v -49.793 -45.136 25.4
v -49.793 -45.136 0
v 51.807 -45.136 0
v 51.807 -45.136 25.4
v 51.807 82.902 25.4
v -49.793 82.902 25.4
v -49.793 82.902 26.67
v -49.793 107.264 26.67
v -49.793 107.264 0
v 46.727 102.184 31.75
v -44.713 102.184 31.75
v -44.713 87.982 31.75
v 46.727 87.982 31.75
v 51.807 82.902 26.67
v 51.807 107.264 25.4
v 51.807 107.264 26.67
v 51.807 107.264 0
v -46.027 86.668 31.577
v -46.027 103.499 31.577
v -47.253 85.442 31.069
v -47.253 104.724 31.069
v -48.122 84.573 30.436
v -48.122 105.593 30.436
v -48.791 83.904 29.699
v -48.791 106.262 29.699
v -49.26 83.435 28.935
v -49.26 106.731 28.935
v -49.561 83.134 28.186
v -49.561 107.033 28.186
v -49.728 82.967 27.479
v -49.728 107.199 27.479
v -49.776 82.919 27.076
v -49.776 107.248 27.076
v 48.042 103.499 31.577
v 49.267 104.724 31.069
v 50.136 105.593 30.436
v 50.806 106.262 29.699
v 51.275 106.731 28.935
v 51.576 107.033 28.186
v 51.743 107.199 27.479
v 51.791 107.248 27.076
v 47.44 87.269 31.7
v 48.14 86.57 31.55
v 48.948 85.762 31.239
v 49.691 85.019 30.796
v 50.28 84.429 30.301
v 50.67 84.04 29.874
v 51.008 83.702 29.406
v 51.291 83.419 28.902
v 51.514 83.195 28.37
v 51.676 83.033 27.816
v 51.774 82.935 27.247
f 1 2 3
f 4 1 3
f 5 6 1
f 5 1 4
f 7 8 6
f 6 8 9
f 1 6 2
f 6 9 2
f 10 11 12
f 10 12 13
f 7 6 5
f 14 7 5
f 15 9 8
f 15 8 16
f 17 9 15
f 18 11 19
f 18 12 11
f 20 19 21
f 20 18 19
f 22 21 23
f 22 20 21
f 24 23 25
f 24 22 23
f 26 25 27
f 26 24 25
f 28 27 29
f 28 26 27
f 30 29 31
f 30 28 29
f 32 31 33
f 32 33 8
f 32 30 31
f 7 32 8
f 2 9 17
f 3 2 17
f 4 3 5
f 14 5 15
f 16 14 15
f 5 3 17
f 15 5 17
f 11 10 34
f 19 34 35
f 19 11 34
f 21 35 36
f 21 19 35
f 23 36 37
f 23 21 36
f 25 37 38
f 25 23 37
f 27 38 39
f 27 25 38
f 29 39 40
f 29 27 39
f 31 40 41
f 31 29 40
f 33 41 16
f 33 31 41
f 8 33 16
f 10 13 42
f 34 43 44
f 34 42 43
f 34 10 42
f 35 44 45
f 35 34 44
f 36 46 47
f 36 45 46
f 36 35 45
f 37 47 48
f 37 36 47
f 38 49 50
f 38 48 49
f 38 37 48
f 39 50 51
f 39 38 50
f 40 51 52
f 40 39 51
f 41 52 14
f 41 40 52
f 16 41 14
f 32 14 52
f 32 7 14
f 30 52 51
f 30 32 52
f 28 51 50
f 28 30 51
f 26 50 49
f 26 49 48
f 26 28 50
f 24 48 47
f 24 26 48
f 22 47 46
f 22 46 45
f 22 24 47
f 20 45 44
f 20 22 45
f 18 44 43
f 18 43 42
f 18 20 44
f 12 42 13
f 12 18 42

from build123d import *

# Parameters (mm, degrees)
F0_W     = 101.6
F0_H     = 152.4
F1_DEPTH = 25.4
F3_DEPTH = 6.35
F2_W     = 51.8073203593
F2_H     = 24.3617037889
F4_DEPTH = 6.35
F5_R     = 5.08


with BuildPart() as f1:
    # F0 (on Top) → F1 (new body)
    with BuildSketch(Plane.XY):
        with Locations((1.0073203593, 31.0641650792)):
            Rectangle(F0_W, F0_H)
    extrude(amount=F1_DEPTH)

    # F2 (on face) → F3 (join)
    with BuildSketch(Plane.XY.offset(25.4)):
        Polygon((-49.7926796407, 107.2641650792), (-49.7926796407, 82.9024612904), (-8.9114280418, 82.9024612904), (0, 82.9024612904), (0, 107.2641650792), align=None)
    extrude(amount=F3_DEPTH)

    # F2 (on face) → F4 (join)
    with BuildSketch(Plane.XY.offset(25.4)):
        with Locations((25.9036601797, 95.0833131848)):
            Rectangle(F2_W, F2_H)
    extrude(amount=F4_DEPTH)

    # F5
    f5_edges = [f1.edges().sort_by_distance(p)[0] for p in [
        (-49.79268, 95.083313, 31.75),
        (1.00732, 82.902461, 31.75),
        (51.80732, 95.083313, 31.75),
        (1.00732, 107.264165, 31.75),
    ]]
    fillet(f5_edges, radius=F5_R)


solid = f1.part
